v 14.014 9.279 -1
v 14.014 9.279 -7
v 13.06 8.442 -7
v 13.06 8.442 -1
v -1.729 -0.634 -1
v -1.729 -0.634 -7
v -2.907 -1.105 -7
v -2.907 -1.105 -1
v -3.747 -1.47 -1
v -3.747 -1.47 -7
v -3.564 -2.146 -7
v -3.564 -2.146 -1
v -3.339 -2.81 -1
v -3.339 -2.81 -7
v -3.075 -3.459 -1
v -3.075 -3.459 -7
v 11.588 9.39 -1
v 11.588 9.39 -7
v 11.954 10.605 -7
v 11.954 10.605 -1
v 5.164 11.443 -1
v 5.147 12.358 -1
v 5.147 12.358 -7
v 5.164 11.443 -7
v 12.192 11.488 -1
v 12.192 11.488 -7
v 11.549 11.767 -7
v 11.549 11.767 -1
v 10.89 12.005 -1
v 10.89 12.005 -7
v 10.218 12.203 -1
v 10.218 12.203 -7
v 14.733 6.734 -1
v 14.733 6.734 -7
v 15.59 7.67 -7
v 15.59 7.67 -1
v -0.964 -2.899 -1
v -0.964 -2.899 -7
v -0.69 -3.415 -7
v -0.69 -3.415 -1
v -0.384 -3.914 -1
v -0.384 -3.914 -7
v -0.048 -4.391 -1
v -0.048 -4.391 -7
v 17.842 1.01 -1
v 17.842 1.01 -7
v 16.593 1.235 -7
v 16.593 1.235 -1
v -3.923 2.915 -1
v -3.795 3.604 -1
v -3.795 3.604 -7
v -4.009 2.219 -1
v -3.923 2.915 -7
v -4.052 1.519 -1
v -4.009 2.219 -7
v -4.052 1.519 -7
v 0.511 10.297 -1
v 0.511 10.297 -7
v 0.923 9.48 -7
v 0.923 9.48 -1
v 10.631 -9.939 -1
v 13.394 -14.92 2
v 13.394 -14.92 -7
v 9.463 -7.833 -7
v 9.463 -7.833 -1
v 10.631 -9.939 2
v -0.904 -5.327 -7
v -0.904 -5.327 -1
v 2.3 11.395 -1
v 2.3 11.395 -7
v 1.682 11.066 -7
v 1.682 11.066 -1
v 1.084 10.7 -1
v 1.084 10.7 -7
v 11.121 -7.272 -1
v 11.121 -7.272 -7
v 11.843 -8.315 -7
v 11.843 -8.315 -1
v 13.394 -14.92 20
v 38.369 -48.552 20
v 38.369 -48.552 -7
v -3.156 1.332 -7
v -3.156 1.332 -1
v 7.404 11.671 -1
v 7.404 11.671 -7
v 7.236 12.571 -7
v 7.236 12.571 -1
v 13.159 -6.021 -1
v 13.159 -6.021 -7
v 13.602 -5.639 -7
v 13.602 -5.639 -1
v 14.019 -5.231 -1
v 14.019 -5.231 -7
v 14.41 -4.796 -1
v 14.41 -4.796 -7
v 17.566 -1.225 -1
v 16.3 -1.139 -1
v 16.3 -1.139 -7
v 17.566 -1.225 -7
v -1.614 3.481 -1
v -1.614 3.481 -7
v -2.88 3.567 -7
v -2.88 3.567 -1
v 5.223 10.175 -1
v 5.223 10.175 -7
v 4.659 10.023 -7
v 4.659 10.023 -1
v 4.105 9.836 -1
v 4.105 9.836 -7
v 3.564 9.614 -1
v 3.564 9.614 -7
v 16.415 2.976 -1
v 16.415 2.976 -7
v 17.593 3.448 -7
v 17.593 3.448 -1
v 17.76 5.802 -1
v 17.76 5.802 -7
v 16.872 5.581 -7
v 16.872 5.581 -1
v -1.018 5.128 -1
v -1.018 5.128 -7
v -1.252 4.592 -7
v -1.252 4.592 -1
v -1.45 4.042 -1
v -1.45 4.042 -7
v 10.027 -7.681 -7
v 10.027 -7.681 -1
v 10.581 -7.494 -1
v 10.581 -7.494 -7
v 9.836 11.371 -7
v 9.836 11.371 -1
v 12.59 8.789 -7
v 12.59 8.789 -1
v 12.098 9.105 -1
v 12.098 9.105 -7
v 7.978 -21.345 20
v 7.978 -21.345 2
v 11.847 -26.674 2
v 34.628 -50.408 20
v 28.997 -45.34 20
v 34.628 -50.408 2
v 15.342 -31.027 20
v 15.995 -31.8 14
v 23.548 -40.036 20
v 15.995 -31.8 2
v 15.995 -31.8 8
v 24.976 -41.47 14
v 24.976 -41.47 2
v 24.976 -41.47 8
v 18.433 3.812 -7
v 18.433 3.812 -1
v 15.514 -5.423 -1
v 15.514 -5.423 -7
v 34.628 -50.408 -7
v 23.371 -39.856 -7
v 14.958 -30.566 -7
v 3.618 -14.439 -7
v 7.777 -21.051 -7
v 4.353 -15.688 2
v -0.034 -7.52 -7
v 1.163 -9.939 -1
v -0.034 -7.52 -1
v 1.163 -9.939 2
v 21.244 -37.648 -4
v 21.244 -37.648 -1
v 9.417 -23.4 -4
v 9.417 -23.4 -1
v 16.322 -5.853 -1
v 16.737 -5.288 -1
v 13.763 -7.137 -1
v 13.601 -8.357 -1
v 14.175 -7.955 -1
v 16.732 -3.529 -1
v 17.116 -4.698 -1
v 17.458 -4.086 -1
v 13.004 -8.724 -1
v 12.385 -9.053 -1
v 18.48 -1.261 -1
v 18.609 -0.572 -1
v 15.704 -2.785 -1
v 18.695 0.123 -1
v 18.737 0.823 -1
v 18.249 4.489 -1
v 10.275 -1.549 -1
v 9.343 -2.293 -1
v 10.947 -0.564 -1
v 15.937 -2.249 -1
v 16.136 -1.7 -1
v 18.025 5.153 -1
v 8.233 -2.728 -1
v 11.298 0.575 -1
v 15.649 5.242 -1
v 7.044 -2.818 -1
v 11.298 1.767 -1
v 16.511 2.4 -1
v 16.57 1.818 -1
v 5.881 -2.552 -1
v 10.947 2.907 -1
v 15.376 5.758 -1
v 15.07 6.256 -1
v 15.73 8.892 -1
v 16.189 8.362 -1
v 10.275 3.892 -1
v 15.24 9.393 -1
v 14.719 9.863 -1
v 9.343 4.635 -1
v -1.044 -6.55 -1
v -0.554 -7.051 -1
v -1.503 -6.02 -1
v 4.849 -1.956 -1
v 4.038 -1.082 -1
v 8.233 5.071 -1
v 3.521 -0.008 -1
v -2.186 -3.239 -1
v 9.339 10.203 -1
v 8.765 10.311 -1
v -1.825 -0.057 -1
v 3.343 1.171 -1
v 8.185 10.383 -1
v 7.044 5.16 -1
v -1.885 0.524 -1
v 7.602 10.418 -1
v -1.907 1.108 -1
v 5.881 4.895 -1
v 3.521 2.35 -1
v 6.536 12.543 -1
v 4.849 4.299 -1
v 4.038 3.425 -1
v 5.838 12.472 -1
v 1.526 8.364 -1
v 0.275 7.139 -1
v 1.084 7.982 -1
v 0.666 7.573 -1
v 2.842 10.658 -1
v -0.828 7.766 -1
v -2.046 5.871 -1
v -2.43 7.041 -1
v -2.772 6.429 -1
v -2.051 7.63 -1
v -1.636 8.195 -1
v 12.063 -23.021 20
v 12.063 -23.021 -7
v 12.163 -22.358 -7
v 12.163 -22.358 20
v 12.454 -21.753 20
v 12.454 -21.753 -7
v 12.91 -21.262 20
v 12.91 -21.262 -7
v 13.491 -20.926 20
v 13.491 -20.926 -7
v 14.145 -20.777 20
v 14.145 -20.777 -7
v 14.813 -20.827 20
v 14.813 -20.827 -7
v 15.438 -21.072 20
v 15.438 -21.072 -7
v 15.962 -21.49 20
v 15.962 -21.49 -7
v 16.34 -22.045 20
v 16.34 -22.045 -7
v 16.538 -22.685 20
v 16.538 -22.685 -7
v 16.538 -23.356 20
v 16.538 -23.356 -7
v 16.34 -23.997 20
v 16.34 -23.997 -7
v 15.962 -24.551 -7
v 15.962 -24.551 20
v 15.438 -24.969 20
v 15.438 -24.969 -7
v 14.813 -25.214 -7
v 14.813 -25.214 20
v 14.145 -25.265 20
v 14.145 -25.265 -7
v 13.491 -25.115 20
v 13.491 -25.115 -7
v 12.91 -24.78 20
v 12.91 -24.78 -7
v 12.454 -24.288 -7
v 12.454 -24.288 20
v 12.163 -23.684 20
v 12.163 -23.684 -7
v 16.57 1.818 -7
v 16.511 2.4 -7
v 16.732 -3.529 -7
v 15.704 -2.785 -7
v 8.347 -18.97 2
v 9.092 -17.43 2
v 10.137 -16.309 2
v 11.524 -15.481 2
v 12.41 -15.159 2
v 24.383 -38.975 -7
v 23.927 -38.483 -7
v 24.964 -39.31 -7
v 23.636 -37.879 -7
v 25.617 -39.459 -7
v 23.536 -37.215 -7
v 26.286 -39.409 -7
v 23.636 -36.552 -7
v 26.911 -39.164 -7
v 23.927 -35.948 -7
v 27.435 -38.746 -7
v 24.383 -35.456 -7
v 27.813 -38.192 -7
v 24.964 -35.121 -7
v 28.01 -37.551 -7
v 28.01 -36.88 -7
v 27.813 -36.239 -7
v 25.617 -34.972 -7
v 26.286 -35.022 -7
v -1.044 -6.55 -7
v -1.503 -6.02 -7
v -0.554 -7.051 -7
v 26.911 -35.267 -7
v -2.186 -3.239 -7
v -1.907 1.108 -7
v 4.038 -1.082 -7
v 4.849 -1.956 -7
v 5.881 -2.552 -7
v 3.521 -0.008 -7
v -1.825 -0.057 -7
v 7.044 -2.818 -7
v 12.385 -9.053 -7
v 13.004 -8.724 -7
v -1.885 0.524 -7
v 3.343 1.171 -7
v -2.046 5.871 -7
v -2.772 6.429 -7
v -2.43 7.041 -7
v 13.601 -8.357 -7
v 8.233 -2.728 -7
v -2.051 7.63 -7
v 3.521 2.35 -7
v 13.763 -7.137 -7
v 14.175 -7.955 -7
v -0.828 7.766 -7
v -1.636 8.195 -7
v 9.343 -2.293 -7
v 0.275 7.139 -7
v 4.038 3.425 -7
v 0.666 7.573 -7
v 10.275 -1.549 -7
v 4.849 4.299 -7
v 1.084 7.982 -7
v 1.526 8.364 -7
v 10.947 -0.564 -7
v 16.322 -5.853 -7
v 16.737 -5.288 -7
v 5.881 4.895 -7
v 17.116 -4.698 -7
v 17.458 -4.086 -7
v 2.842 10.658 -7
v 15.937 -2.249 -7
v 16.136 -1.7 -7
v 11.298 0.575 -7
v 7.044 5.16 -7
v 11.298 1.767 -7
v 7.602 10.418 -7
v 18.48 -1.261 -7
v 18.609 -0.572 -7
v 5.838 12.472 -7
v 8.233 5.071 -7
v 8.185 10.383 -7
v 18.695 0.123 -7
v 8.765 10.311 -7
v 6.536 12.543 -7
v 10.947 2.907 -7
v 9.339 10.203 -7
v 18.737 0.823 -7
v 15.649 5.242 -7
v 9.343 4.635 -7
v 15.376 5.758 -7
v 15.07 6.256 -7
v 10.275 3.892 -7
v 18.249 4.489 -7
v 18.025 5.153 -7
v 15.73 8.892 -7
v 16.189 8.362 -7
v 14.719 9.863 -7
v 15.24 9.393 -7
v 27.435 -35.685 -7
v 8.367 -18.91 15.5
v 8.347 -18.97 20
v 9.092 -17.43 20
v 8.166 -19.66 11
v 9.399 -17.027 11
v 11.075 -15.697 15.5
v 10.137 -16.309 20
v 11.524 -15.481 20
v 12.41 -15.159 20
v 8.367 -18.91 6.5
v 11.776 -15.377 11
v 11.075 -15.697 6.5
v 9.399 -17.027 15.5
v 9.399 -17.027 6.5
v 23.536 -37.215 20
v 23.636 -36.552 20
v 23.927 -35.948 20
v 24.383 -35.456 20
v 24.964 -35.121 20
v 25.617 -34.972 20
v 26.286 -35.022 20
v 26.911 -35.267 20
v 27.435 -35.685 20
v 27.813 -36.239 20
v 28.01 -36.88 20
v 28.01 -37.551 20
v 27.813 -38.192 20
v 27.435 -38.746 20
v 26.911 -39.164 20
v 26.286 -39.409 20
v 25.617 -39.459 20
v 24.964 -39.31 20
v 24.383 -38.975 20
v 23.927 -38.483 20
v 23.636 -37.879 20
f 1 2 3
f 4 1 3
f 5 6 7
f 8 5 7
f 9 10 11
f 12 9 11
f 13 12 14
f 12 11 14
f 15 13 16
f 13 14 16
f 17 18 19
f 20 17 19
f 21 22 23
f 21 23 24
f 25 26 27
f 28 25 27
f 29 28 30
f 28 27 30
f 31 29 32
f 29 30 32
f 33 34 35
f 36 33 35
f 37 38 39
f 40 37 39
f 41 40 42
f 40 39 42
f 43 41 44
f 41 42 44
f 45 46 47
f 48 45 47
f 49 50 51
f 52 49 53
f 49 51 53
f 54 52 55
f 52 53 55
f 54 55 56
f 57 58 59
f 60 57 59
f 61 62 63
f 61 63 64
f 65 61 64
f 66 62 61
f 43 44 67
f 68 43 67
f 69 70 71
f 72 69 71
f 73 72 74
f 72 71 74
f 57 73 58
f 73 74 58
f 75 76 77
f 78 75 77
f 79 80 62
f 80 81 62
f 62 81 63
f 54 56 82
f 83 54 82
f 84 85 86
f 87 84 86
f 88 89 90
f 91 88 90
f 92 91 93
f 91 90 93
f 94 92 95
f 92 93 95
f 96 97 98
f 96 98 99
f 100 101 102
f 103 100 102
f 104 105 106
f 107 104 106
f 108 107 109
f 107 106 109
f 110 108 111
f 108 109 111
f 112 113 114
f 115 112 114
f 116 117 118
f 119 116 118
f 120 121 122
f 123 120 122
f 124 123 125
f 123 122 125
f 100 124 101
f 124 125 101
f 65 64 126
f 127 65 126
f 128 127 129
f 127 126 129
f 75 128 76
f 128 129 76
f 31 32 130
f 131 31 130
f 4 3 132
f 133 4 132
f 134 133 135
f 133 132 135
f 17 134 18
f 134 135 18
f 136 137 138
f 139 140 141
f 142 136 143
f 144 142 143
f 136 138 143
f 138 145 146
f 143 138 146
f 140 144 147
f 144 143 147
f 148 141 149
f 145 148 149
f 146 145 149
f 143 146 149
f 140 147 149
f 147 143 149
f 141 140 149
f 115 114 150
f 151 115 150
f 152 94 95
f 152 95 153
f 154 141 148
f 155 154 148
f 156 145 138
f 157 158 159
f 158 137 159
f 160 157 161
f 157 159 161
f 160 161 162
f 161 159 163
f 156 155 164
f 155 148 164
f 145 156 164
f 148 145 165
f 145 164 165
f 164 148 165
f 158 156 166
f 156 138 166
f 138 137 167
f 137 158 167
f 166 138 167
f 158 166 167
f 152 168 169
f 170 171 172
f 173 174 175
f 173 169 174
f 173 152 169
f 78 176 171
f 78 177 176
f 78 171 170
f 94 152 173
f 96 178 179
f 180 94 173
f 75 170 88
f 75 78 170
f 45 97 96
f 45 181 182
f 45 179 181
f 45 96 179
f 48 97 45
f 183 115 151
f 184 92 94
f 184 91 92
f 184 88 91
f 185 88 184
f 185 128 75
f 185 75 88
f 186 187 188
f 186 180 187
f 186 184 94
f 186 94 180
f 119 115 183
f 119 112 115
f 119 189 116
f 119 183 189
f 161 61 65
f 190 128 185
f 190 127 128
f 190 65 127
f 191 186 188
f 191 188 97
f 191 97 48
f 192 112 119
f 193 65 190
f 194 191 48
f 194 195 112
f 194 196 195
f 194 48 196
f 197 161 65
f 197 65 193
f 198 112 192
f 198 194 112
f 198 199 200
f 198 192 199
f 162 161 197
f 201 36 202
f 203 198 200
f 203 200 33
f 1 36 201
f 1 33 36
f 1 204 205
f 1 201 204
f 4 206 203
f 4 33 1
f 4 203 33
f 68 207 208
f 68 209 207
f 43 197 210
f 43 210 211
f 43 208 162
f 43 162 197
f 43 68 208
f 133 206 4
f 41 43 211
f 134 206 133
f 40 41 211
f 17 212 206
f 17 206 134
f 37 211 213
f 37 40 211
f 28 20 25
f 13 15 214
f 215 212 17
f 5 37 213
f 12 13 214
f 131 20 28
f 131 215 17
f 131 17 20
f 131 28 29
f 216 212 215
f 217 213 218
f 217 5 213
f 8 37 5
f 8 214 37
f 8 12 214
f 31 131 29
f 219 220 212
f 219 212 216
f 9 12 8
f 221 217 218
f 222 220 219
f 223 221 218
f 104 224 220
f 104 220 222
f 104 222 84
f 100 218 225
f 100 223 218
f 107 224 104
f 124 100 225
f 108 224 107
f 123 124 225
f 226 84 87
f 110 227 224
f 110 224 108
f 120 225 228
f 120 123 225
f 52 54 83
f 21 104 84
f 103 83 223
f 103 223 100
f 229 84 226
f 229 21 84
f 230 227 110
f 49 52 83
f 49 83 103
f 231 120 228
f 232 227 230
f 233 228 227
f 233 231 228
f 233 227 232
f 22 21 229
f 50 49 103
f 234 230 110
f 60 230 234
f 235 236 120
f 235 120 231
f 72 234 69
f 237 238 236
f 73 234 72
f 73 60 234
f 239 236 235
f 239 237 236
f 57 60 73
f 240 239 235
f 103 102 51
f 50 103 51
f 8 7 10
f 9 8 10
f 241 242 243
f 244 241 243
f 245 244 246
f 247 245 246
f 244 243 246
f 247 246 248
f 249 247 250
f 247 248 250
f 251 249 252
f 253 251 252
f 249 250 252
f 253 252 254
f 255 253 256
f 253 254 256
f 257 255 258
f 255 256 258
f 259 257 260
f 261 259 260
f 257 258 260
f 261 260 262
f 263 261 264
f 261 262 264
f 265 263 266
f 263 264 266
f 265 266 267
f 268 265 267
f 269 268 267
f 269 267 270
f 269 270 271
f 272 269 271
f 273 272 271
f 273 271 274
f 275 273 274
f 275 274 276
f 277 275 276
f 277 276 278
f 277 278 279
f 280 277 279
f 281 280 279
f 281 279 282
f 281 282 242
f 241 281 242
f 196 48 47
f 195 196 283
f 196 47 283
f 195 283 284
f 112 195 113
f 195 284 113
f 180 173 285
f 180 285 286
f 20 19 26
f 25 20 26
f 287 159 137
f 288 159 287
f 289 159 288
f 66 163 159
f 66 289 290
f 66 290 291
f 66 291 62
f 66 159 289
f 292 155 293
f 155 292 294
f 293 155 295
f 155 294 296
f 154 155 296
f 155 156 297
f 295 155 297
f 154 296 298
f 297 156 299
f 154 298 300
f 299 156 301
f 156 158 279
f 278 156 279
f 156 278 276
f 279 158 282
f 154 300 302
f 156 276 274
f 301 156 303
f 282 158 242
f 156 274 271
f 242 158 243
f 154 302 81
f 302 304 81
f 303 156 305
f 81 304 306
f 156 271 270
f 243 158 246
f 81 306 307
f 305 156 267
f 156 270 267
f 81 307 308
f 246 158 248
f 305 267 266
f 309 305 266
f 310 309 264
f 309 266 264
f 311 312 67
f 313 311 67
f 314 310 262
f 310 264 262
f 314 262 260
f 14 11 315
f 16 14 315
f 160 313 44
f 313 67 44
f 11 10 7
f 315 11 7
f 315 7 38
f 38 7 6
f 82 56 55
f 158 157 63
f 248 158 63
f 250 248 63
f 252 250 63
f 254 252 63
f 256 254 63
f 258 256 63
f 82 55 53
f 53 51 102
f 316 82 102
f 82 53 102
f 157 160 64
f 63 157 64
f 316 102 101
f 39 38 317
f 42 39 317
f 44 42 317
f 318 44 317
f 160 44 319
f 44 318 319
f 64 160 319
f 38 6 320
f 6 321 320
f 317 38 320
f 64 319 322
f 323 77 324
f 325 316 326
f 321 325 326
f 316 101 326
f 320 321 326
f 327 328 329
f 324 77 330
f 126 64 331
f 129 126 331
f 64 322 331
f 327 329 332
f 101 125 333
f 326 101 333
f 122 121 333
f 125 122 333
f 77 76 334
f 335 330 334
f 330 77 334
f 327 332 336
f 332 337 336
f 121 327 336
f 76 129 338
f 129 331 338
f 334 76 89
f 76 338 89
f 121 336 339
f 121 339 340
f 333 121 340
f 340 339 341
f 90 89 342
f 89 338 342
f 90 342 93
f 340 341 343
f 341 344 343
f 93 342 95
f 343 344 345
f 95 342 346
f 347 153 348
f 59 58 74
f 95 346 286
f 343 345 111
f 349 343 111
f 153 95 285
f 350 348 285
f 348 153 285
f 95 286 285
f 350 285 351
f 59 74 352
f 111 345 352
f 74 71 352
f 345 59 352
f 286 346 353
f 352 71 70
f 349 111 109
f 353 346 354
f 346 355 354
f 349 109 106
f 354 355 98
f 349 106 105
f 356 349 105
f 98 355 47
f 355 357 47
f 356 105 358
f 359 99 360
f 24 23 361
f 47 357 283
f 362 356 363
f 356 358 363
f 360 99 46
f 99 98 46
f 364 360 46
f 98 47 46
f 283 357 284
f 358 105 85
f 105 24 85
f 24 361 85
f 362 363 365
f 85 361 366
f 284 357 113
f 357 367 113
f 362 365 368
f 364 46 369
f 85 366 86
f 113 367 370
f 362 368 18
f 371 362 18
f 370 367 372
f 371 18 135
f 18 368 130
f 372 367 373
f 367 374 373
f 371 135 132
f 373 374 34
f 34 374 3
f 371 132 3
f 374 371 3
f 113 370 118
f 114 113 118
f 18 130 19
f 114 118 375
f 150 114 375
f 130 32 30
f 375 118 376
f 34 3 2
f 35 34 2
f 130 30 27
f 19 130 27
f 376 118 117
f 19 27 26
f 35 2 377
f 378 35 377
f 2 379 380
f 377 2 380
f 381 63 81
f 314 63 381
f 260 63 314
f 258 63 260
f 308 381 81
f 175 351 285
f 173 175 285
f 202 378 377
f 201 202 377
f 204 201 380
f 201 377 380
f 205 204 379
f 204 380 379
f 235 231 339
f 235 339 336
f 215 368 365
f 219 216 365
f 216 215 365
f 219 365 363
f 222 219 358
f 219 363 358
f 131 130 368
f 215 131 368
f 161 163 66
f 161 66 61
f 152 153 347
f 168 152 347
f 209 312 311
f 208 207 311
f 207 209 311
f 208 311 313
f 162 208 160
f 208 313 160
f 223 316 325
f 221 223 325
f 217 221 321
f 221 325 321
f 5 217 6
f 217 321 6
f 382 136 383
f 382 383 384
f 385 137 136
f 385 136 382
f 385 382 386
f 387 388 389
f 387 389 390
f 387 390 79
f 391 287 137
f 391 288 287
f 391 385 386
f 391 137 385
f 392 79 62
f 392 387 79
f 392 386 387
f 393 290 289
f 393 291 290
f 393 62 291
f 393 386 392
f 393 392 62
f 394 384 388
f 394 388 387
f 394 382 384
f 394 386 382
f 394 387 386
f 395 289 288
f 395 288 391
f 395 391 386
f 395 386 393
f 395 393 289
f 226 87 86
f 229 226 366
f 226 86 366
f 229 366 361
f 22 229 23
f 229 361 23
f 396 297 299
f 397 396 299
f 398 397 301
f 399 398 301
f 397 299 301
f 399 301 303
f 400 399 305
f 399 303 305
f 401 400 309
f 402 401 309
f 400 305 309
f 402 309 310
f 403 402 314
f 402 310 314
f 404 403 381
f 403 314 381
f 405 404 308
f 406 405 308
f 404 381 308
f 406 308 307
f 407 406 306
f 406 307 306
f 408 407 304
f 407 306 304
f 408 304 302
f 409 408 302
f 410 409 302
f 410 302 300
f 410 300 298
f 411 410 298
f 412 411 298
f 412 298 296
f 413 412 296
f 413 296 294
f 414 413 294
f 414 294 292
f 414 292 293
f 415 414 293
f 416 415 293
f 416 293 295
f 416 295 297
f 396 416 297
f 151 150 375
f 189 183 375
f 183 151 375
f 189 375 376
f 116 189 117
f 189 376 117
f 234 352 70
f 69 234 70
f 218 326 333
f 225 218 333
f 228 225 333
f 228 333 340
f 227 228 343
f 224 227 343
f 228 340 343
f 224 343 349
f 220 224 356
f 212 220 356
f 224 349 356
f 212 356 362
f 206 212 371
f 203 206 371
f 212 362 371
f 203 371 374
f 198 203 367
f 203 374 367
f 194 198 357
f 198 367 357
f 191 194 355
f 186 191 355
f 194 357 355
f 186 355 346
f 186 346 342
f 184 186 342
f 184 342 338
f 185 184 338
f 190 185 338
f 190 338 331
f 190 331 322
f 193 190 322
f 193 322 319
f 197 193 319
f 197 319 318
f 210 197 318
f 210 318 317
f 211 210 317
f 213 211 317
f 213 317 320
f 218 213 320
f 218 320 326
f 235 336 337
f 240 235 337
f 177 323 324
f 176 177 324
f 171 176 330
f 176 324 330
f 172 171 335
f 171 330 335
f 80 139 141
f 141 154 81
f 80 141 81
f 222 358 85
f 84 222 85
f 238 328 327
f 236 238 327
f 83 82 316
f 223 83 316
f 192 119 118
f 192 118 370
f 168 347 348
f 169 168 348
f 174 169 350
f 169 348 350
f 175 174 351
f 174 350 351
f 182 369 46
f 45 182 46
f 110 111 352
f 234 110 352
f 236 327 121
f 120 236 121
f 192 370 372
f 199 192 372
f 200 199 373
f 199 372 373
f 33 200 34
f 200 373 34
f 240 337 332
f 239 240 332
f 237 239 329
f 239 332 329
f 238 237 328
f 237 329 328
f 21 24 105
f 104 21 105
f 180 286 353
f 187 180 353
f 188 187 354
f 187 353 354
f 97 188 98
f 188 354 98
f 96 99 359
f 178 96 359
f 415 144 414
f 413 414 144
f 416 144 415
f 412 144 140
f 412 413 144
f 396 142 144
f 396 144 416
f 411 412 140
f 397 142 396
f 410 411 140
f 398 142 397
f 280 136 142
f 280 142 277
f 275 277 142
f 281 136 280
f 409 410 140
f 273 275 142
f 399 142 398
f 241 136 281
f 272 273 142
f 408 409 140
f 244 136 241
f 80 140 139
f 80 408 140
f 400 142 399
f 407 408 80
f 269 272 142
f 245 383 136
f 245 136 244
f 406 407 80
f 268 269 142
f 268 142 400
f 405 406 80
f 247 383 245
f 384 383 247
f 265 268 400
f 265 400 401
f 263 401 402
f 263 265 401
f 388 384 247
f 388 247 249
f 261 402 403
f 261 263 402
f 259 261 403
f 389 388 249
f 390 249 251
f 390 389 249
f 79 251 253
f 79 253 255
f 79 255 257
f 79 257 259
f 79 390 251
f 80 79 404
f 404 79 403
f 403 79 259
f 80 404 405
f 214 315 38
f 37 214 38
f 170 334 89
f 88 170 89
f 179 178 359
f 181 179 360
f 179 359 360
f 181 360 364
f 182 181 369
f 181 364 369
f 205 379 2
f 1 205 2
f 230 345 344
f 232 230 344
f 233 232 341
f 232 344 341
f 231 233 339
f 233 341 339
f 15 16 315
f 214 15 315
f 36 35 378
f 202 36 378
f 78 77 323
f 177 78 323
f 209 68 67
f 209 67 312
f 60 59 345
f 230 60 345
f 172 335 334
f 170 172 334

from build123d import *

# Parameters (mm, degrees)
BOSS_EXTRUDE1_DEPTH      = 2
BOSS_EXTRUDE1_DEPTH_BACK = 7
BOSS_EXTRUDE3_DEPTH      = 9
SKETCH6_R                = 4
CUT_EXTRUDE1_DEPTH       = 18
BOSS_EXTRUDE4_DEPTH      = 18
SKETCH8_R                = 2.25
CUT_EXTRUDE2_DEPTH       = 69.863255609
CUT_EXTRUDE3_DEPTH       = 67.431528446
CUT_EXTRUDE3_DEPTH_BACK  = 67.431528446
SKETCH9_W                = 10.323299019
SKETCH9_H                = 27.481333942


with BuildPart() as part:
    # Sketch2 → Boss-Extrude1 (new, two sides: drawn at the far end of the back side and taken through both)
    with BuildSketch(Plane.XY.offset(-BOSS_EXTRUDE1_DEPTH_BACK)):
        with BuildLine():
            Line((17.593003447, 3.447921134), (18.432689254, 3.812129579))
            ThreePointArc((18.432689254, 3.812129579), (18.142308848, 4.822341152), (17.760116965, 5.801513031))
            Line((17.760116965, 5.801513031), (16.871688472, 5.581479263))
            Line((16.871688472, 5.581479263), (15.649099733, 5.241598415))
            ThreePointArc((15.649099733, 5.241598415), (15.22663553, 6.009376293), (14.733410626, 6.733729845))
            Line((14.733410626, 6.733729845), (15.590096731, 7.669855443))
            Line((15.590096731, 7.669855443), (16.188603379, 8.362321932))
            ThreePointArc((16.188603379, 8.362321932), (15.488665299, 9.146499772), (14.719475556, 9.862876308))
            Line((14.719475556, 9.862876308), (14.014498216, 9.279158058))
            Line((14.014498216, 9.279158058), (13.060452596, 8.442474621))
            ThreePointArc((13.060452596, 8.442474621), (12.346699165, 8.950918239), (11.588033655, 9.389535972))
            Line((11.588033655, 9.389535972), (11.95371149, 10.604658163))
            Line((11.95371149, 10.604658163), (12.192497398, 11.488231214))
            ThreePointArc((12.192497398, 11.488231214), (11.221632964, 11.891059284), (10.217792822, 12.202753318))
            Line((10.217792822, 12.202753318), (9.835896044, 11.370963143))
            Line((9.835896044, 11.370963143), (9.33935398, 10.203192533))
            ThreePointArc((9.33935398, 10.203192533), (8.475678941, 10.351598396), (7.601835833, 10.417606691))
            Line((7.601835833, 10.417606691), (7.404078418, 11.671055622))
            Line((7.404078418, 11.671055622), (7.235849109, 12.570732756))
            ThreePointArc((7.235849109, 12.570732756), (6.18634993, 12.512426015), (5.14668224, 12.357702722))
            Line((5.14668224, 12.357702722), (5.163505363, 11.442586867))
            Line((5.163505363, 11.442586867), (5.222813101, 10.175020376))
            ThreePointArc((5.222813101, 10.175020376), (4.380277888, 9.933994883), (3.564332526, 9.614319987))
            Line((3.564332526, 9.614319987), (2.842308143, 10.657834724))
            Line((2.842308143, 10.657834724), (2.300383494, 11.395423851))
            ThreePointArc((2.300383494, 11.395423851), (1.380115753, 10.887530665), (0.510539453, 10.297034891))
            Line((0.510539453, 10.297034891), (0.922750452, 9.479843274))
            Line((0.922750452, 9.479843274), (1.526161366, 8.363537991))
            ThreePointArc((1.526161366, 8.363537991), (0.871640411, 7.780819197), (0.275200782, 7.138776643))
            Line((0.275200782, 7.138776643), (-0.828084785, 7.765676295))
            Line((-0.828084785, 7.765676295), (-1.636369952, 8.195088843))
            ThreePointArc((-1.636369952, 8.195088843), (-2.245135941, 7.338203686), (-2.772390602, 6.42889036))
            Line((-2.772390602, 6.42889036), (-2.04643517, 5.871477804))
            Line((-2.04643517, 5.871477804), (-1.018434012, 5.12753168))
            ThreePointArc((-1.018434012, 5.12753168), (-1.355304806, 4.318534189), (-1.61410652, 3.481288379))
            Line((-1.61410652, 3.481288379), (-2.880134034, 3.567407782))
            Line((-2.880134034, 3.567407782), (-3.794688927, 3.603593329))
            ThreePointArc((-3.794688927, 3.603593329), (-3.971379595, 2.567432815), (-4.051883364, 1.519402593))
            Line((-4.051883364, 1.519402593), (-3.155967876, 1.332171491))
            Line((-3.155967876, 1.332171491), (-1.90698471, 1.107932181))
            ThreePointArc((-1.90698471, 1.107932181), (-1.859483953, 0.232887867), (-1.729388897, -0.633734398))
            Line((-1.729388897, -0.633734398), (-2.907406081, -1.105452248))
            Line((-2.907406081, -1.105452248), (-3.747091888, -1.469660694))
            ThreePointArc((-3.747091888, -1.469660694), (-3.456711482, -2.479872267), (-3.0745196, -3.459044145))
            Line((-3.0745196, -3.459044145), (-2.186091107, -3.239010378))
            Line((-2.186091107, -3.239010378), (-0.963502367, -2.899129529))
            ThreePointArc((-0.963502367, -2.899129529), (-0.541038164, -3.666907408), (-0.047813261, -4.391260959))
            Line((-0.047813261, -4.391260959), (-0.904499365, -5.327386558))
            Line((-0.904499365, -5.327386558), (-1.503006014, -6.019853046))
            ThreePointArc((-1.503006014, -6.019853046), (-0.803067933, -6.804030887), (-0.03387819, -7.520407423))
            Line((-0.03387819, -7.520407423), (0.67109915, -6.936689172))
            Line((0.67109915, -6.936689172), (1.625144769, -6.100005735))
            ThreePointArc((1.625144769, -6.100005735), (2.3388982, -6.608449353), (3.097563711, -7.047067087))
            Line((3.097563711, -7.047067087), (2.731885876, -8.262189278))
            Line((2.731885876, -8.262189278), (2.493099968, -9.145762328))
            ThreePointArc((2.493099968, -9.145762328), (3.463964401, -9.548590398), (4.467804544, -9.860284433))
            Line((4.467804544, -9.860284433), (4.849701322, -9.028494257))
            Line((4.849701322, -9.028494257), (5.346243386, -7.860723648))
            ThreePointArc((5.346243386, -7.860723648), (6.209918425, -8.009129511), (7.083761533, -8.075137806))
            Line((7.083761533, -8.075137806), (7.281518948, -9.328586736))
            Line((7.281518948, -9.328586736), (7.449748257, -10.22826387))
            ThreePointArc((7.449748257, -10.22826387), (8.499247436, -10.16995713), (9.538915126, -10.015233837))
            Line((9.538915126, -10.015233837), (9.522092003, -9.100117982))
            Line((9.522092003, -9.100117982), (9.462784265, -7.83255149))
            ThreePointArc((9.462784265, -7.83255149), (10.305319478, -7.591525998), (11.12126484, -7.271851101))
            Line((11.12126484, -7.271851101), (11.843289223, -8.315365839))
            Line((11.843289223, -8.315365839), (12.385213872, -9.052954966))
            ThreePointArc((12.385213872, -9.052954966), (13.305481612, -8.54506178), (14.175057913, -7.954566005))
            Line((14.175057913, -7.954566005), (13.762846914, -7.137374389))
            Line((13.762846914, -7.137374389), (13.159436, -6.021069105))
            ThreePointArc((13.159436, -6.021069105), (13.813956955, -5.438350311), (14.410396584, -4.796307757))
            Line((14.410396584, -4.796307757), (15.513682151, -5.42320741))
            Line((15.513682151, -5.42320741), (16.321967317, -5.852619957))
            ThreePointArc((16.321967317, -5.852619957), (16.930733307, -4.9957348), (17.457987967, -4.086421474))
            Line((17.457987967, -4.086421474), (16.732032536, -3.529008918))
            Line((16.732032536, -3.529008918), (15.704031377, -2.785062794))
            ThreePointArc((15.704031377, -2.785062794), (16.040902172, -1.976065303), (16.299703886, -1.138819493))
            Line((16.299703886, -1.138819493), (17.565731399, -1.224938896))
            Line((17.565731399, -1.224938896), (18.480286292, -1.261124443))
            ThreePointArc((18.480286292, -1.261124443), (18.656976961, -0.22496393), (18.737480729, 0.823066292))
            Line((18.737480729, 0.823066292), (17.841565242, 1.010297394))
            Line((17.841565242, 1.010297394), (16.592582076, 1.234536705))
            ThreePointArc((16.592582076, 1.234536705), (16.545081318, 2.109581019), (16.414986263, 2.976203284))
            Line((16.414986263, 2.976203284), (17.593003447, 3.447921134))
        make_face()
    extrude(amount=BOSS_EXTRUDE1_DEPTH + BOSS_EXTRUDE1_DEPTH_BACK)

    # Sketch5 → Boss-Extrude3 (add)
    with BuildSketch(Plane.XY.offset(2)):
        with BuildLine():
            Line((34.627961915, -50.407866333), (38.369192873, -48.55177457))
            Line((38.369192873, -48.55177457), (13.393984011, -14.920355903))
            Line((13.393984011, -14.920355903), (9.462784265, -7.83255149))
            Line((9.462784265, -7.83255149), (0.865656202, -2.843190202))
            Line((0.865656202, -2.843190202), (-0.03387819, -7.520407423))
            add(Edge.make_bspline(
                [(34.627961915, -50.407866333), (20.737528927, -38.343464696), (7.957182105, -24.264537371), (-0.03387819, -7.520407423)],
                knots=[0, 0, 0, 0, 1, 1, 1, 1], degree=3))
        make_face()
    extrude(amount=-BOSS_EXTRUDE3_DEPTH)

    # Sketch6 → Cut-Extrude1 (cut)
    with BuildSketch(Plane(origin=(0, 0, -7), x_dir=(-1, 0, 0), z_dir=(0, 0, -1))):
        with Locations((-7.342798683, 1.171234443)):
            Circle(SKETCH6_R)
    extrude(amount=-CUT_EXTRUDE1_DEPTH, mode=Mode.SUBTRACT)

    # Sketch7 → Boss-Extrude4 (add)
    with BuildSketch(Plane.XY.offset(2)):
        with BuildLine():
            Line((34.627961915, -50.407866333), (38.369192873, -48.55177457))
            Line((38.369192873, -48.55177457), (13.393984011, -14.920355903))
            add(Edge.make_bspline(
                [(7.977955023, -21.345123668), (8.112113434, -15.921271934), (13.393984011, -14.920355903)],
                knots=[0, 0, 0, 1, 1, 1], degree=2))
            add(Edge.make_bspline(
                [(7.977955023, -21.345123668), (15.413845314, -32.210109704), (24.739621619, -41.819443715), (34.627961915, -50.407866333)],
                knots=[0.288118642, 0.288118642, 0.288118642, 0.288118642, 1, 1, 1, 1], degree=3))
        make_face()
    extrude(amount=BOSS_EXTRUDE4_DEPTH)

    # Sketch8 → Cut-Extrude2 (cut, through all)
    with BuildSketch(Plane(origin=(0, 0, -7), x_dir=(-1, 0, 0), z_dir=(0, 0, -1))):
        with Locations((-14.312794722, -23.020807584)):
            Circle(SKETCH8_R)
        with Locations((-25.785580409, -37.215397344)):
            Circle(SKETCH8_R)
    extrude(amount=-CUT_EXTRUDE2_DEPTH, mode=Mode.SUBTRACT)

    # Sketch9 → Cut-Extrude3 (cut, two sides: drawn at the far end of the back side and taken through both)
    with BuildSketch(Plane(origin=(0, 0, 0), x_dir=(0, 0, -1), z_dir=(1, 0, 0)).offset(-CUT_EXTRUDE3_DEPTH_BACK)):
        with Locations((-4.16164951, 3.801629666)):
            Rectangle(SKETCH9_W, SKETCH9_H)
    extrude(amount=CUT_EXTRUDE3_DEPTH + CUT_EXTRUDE3_DEPTH_BACK, mode=Mode.SUBTRACT)


solid = part.part
